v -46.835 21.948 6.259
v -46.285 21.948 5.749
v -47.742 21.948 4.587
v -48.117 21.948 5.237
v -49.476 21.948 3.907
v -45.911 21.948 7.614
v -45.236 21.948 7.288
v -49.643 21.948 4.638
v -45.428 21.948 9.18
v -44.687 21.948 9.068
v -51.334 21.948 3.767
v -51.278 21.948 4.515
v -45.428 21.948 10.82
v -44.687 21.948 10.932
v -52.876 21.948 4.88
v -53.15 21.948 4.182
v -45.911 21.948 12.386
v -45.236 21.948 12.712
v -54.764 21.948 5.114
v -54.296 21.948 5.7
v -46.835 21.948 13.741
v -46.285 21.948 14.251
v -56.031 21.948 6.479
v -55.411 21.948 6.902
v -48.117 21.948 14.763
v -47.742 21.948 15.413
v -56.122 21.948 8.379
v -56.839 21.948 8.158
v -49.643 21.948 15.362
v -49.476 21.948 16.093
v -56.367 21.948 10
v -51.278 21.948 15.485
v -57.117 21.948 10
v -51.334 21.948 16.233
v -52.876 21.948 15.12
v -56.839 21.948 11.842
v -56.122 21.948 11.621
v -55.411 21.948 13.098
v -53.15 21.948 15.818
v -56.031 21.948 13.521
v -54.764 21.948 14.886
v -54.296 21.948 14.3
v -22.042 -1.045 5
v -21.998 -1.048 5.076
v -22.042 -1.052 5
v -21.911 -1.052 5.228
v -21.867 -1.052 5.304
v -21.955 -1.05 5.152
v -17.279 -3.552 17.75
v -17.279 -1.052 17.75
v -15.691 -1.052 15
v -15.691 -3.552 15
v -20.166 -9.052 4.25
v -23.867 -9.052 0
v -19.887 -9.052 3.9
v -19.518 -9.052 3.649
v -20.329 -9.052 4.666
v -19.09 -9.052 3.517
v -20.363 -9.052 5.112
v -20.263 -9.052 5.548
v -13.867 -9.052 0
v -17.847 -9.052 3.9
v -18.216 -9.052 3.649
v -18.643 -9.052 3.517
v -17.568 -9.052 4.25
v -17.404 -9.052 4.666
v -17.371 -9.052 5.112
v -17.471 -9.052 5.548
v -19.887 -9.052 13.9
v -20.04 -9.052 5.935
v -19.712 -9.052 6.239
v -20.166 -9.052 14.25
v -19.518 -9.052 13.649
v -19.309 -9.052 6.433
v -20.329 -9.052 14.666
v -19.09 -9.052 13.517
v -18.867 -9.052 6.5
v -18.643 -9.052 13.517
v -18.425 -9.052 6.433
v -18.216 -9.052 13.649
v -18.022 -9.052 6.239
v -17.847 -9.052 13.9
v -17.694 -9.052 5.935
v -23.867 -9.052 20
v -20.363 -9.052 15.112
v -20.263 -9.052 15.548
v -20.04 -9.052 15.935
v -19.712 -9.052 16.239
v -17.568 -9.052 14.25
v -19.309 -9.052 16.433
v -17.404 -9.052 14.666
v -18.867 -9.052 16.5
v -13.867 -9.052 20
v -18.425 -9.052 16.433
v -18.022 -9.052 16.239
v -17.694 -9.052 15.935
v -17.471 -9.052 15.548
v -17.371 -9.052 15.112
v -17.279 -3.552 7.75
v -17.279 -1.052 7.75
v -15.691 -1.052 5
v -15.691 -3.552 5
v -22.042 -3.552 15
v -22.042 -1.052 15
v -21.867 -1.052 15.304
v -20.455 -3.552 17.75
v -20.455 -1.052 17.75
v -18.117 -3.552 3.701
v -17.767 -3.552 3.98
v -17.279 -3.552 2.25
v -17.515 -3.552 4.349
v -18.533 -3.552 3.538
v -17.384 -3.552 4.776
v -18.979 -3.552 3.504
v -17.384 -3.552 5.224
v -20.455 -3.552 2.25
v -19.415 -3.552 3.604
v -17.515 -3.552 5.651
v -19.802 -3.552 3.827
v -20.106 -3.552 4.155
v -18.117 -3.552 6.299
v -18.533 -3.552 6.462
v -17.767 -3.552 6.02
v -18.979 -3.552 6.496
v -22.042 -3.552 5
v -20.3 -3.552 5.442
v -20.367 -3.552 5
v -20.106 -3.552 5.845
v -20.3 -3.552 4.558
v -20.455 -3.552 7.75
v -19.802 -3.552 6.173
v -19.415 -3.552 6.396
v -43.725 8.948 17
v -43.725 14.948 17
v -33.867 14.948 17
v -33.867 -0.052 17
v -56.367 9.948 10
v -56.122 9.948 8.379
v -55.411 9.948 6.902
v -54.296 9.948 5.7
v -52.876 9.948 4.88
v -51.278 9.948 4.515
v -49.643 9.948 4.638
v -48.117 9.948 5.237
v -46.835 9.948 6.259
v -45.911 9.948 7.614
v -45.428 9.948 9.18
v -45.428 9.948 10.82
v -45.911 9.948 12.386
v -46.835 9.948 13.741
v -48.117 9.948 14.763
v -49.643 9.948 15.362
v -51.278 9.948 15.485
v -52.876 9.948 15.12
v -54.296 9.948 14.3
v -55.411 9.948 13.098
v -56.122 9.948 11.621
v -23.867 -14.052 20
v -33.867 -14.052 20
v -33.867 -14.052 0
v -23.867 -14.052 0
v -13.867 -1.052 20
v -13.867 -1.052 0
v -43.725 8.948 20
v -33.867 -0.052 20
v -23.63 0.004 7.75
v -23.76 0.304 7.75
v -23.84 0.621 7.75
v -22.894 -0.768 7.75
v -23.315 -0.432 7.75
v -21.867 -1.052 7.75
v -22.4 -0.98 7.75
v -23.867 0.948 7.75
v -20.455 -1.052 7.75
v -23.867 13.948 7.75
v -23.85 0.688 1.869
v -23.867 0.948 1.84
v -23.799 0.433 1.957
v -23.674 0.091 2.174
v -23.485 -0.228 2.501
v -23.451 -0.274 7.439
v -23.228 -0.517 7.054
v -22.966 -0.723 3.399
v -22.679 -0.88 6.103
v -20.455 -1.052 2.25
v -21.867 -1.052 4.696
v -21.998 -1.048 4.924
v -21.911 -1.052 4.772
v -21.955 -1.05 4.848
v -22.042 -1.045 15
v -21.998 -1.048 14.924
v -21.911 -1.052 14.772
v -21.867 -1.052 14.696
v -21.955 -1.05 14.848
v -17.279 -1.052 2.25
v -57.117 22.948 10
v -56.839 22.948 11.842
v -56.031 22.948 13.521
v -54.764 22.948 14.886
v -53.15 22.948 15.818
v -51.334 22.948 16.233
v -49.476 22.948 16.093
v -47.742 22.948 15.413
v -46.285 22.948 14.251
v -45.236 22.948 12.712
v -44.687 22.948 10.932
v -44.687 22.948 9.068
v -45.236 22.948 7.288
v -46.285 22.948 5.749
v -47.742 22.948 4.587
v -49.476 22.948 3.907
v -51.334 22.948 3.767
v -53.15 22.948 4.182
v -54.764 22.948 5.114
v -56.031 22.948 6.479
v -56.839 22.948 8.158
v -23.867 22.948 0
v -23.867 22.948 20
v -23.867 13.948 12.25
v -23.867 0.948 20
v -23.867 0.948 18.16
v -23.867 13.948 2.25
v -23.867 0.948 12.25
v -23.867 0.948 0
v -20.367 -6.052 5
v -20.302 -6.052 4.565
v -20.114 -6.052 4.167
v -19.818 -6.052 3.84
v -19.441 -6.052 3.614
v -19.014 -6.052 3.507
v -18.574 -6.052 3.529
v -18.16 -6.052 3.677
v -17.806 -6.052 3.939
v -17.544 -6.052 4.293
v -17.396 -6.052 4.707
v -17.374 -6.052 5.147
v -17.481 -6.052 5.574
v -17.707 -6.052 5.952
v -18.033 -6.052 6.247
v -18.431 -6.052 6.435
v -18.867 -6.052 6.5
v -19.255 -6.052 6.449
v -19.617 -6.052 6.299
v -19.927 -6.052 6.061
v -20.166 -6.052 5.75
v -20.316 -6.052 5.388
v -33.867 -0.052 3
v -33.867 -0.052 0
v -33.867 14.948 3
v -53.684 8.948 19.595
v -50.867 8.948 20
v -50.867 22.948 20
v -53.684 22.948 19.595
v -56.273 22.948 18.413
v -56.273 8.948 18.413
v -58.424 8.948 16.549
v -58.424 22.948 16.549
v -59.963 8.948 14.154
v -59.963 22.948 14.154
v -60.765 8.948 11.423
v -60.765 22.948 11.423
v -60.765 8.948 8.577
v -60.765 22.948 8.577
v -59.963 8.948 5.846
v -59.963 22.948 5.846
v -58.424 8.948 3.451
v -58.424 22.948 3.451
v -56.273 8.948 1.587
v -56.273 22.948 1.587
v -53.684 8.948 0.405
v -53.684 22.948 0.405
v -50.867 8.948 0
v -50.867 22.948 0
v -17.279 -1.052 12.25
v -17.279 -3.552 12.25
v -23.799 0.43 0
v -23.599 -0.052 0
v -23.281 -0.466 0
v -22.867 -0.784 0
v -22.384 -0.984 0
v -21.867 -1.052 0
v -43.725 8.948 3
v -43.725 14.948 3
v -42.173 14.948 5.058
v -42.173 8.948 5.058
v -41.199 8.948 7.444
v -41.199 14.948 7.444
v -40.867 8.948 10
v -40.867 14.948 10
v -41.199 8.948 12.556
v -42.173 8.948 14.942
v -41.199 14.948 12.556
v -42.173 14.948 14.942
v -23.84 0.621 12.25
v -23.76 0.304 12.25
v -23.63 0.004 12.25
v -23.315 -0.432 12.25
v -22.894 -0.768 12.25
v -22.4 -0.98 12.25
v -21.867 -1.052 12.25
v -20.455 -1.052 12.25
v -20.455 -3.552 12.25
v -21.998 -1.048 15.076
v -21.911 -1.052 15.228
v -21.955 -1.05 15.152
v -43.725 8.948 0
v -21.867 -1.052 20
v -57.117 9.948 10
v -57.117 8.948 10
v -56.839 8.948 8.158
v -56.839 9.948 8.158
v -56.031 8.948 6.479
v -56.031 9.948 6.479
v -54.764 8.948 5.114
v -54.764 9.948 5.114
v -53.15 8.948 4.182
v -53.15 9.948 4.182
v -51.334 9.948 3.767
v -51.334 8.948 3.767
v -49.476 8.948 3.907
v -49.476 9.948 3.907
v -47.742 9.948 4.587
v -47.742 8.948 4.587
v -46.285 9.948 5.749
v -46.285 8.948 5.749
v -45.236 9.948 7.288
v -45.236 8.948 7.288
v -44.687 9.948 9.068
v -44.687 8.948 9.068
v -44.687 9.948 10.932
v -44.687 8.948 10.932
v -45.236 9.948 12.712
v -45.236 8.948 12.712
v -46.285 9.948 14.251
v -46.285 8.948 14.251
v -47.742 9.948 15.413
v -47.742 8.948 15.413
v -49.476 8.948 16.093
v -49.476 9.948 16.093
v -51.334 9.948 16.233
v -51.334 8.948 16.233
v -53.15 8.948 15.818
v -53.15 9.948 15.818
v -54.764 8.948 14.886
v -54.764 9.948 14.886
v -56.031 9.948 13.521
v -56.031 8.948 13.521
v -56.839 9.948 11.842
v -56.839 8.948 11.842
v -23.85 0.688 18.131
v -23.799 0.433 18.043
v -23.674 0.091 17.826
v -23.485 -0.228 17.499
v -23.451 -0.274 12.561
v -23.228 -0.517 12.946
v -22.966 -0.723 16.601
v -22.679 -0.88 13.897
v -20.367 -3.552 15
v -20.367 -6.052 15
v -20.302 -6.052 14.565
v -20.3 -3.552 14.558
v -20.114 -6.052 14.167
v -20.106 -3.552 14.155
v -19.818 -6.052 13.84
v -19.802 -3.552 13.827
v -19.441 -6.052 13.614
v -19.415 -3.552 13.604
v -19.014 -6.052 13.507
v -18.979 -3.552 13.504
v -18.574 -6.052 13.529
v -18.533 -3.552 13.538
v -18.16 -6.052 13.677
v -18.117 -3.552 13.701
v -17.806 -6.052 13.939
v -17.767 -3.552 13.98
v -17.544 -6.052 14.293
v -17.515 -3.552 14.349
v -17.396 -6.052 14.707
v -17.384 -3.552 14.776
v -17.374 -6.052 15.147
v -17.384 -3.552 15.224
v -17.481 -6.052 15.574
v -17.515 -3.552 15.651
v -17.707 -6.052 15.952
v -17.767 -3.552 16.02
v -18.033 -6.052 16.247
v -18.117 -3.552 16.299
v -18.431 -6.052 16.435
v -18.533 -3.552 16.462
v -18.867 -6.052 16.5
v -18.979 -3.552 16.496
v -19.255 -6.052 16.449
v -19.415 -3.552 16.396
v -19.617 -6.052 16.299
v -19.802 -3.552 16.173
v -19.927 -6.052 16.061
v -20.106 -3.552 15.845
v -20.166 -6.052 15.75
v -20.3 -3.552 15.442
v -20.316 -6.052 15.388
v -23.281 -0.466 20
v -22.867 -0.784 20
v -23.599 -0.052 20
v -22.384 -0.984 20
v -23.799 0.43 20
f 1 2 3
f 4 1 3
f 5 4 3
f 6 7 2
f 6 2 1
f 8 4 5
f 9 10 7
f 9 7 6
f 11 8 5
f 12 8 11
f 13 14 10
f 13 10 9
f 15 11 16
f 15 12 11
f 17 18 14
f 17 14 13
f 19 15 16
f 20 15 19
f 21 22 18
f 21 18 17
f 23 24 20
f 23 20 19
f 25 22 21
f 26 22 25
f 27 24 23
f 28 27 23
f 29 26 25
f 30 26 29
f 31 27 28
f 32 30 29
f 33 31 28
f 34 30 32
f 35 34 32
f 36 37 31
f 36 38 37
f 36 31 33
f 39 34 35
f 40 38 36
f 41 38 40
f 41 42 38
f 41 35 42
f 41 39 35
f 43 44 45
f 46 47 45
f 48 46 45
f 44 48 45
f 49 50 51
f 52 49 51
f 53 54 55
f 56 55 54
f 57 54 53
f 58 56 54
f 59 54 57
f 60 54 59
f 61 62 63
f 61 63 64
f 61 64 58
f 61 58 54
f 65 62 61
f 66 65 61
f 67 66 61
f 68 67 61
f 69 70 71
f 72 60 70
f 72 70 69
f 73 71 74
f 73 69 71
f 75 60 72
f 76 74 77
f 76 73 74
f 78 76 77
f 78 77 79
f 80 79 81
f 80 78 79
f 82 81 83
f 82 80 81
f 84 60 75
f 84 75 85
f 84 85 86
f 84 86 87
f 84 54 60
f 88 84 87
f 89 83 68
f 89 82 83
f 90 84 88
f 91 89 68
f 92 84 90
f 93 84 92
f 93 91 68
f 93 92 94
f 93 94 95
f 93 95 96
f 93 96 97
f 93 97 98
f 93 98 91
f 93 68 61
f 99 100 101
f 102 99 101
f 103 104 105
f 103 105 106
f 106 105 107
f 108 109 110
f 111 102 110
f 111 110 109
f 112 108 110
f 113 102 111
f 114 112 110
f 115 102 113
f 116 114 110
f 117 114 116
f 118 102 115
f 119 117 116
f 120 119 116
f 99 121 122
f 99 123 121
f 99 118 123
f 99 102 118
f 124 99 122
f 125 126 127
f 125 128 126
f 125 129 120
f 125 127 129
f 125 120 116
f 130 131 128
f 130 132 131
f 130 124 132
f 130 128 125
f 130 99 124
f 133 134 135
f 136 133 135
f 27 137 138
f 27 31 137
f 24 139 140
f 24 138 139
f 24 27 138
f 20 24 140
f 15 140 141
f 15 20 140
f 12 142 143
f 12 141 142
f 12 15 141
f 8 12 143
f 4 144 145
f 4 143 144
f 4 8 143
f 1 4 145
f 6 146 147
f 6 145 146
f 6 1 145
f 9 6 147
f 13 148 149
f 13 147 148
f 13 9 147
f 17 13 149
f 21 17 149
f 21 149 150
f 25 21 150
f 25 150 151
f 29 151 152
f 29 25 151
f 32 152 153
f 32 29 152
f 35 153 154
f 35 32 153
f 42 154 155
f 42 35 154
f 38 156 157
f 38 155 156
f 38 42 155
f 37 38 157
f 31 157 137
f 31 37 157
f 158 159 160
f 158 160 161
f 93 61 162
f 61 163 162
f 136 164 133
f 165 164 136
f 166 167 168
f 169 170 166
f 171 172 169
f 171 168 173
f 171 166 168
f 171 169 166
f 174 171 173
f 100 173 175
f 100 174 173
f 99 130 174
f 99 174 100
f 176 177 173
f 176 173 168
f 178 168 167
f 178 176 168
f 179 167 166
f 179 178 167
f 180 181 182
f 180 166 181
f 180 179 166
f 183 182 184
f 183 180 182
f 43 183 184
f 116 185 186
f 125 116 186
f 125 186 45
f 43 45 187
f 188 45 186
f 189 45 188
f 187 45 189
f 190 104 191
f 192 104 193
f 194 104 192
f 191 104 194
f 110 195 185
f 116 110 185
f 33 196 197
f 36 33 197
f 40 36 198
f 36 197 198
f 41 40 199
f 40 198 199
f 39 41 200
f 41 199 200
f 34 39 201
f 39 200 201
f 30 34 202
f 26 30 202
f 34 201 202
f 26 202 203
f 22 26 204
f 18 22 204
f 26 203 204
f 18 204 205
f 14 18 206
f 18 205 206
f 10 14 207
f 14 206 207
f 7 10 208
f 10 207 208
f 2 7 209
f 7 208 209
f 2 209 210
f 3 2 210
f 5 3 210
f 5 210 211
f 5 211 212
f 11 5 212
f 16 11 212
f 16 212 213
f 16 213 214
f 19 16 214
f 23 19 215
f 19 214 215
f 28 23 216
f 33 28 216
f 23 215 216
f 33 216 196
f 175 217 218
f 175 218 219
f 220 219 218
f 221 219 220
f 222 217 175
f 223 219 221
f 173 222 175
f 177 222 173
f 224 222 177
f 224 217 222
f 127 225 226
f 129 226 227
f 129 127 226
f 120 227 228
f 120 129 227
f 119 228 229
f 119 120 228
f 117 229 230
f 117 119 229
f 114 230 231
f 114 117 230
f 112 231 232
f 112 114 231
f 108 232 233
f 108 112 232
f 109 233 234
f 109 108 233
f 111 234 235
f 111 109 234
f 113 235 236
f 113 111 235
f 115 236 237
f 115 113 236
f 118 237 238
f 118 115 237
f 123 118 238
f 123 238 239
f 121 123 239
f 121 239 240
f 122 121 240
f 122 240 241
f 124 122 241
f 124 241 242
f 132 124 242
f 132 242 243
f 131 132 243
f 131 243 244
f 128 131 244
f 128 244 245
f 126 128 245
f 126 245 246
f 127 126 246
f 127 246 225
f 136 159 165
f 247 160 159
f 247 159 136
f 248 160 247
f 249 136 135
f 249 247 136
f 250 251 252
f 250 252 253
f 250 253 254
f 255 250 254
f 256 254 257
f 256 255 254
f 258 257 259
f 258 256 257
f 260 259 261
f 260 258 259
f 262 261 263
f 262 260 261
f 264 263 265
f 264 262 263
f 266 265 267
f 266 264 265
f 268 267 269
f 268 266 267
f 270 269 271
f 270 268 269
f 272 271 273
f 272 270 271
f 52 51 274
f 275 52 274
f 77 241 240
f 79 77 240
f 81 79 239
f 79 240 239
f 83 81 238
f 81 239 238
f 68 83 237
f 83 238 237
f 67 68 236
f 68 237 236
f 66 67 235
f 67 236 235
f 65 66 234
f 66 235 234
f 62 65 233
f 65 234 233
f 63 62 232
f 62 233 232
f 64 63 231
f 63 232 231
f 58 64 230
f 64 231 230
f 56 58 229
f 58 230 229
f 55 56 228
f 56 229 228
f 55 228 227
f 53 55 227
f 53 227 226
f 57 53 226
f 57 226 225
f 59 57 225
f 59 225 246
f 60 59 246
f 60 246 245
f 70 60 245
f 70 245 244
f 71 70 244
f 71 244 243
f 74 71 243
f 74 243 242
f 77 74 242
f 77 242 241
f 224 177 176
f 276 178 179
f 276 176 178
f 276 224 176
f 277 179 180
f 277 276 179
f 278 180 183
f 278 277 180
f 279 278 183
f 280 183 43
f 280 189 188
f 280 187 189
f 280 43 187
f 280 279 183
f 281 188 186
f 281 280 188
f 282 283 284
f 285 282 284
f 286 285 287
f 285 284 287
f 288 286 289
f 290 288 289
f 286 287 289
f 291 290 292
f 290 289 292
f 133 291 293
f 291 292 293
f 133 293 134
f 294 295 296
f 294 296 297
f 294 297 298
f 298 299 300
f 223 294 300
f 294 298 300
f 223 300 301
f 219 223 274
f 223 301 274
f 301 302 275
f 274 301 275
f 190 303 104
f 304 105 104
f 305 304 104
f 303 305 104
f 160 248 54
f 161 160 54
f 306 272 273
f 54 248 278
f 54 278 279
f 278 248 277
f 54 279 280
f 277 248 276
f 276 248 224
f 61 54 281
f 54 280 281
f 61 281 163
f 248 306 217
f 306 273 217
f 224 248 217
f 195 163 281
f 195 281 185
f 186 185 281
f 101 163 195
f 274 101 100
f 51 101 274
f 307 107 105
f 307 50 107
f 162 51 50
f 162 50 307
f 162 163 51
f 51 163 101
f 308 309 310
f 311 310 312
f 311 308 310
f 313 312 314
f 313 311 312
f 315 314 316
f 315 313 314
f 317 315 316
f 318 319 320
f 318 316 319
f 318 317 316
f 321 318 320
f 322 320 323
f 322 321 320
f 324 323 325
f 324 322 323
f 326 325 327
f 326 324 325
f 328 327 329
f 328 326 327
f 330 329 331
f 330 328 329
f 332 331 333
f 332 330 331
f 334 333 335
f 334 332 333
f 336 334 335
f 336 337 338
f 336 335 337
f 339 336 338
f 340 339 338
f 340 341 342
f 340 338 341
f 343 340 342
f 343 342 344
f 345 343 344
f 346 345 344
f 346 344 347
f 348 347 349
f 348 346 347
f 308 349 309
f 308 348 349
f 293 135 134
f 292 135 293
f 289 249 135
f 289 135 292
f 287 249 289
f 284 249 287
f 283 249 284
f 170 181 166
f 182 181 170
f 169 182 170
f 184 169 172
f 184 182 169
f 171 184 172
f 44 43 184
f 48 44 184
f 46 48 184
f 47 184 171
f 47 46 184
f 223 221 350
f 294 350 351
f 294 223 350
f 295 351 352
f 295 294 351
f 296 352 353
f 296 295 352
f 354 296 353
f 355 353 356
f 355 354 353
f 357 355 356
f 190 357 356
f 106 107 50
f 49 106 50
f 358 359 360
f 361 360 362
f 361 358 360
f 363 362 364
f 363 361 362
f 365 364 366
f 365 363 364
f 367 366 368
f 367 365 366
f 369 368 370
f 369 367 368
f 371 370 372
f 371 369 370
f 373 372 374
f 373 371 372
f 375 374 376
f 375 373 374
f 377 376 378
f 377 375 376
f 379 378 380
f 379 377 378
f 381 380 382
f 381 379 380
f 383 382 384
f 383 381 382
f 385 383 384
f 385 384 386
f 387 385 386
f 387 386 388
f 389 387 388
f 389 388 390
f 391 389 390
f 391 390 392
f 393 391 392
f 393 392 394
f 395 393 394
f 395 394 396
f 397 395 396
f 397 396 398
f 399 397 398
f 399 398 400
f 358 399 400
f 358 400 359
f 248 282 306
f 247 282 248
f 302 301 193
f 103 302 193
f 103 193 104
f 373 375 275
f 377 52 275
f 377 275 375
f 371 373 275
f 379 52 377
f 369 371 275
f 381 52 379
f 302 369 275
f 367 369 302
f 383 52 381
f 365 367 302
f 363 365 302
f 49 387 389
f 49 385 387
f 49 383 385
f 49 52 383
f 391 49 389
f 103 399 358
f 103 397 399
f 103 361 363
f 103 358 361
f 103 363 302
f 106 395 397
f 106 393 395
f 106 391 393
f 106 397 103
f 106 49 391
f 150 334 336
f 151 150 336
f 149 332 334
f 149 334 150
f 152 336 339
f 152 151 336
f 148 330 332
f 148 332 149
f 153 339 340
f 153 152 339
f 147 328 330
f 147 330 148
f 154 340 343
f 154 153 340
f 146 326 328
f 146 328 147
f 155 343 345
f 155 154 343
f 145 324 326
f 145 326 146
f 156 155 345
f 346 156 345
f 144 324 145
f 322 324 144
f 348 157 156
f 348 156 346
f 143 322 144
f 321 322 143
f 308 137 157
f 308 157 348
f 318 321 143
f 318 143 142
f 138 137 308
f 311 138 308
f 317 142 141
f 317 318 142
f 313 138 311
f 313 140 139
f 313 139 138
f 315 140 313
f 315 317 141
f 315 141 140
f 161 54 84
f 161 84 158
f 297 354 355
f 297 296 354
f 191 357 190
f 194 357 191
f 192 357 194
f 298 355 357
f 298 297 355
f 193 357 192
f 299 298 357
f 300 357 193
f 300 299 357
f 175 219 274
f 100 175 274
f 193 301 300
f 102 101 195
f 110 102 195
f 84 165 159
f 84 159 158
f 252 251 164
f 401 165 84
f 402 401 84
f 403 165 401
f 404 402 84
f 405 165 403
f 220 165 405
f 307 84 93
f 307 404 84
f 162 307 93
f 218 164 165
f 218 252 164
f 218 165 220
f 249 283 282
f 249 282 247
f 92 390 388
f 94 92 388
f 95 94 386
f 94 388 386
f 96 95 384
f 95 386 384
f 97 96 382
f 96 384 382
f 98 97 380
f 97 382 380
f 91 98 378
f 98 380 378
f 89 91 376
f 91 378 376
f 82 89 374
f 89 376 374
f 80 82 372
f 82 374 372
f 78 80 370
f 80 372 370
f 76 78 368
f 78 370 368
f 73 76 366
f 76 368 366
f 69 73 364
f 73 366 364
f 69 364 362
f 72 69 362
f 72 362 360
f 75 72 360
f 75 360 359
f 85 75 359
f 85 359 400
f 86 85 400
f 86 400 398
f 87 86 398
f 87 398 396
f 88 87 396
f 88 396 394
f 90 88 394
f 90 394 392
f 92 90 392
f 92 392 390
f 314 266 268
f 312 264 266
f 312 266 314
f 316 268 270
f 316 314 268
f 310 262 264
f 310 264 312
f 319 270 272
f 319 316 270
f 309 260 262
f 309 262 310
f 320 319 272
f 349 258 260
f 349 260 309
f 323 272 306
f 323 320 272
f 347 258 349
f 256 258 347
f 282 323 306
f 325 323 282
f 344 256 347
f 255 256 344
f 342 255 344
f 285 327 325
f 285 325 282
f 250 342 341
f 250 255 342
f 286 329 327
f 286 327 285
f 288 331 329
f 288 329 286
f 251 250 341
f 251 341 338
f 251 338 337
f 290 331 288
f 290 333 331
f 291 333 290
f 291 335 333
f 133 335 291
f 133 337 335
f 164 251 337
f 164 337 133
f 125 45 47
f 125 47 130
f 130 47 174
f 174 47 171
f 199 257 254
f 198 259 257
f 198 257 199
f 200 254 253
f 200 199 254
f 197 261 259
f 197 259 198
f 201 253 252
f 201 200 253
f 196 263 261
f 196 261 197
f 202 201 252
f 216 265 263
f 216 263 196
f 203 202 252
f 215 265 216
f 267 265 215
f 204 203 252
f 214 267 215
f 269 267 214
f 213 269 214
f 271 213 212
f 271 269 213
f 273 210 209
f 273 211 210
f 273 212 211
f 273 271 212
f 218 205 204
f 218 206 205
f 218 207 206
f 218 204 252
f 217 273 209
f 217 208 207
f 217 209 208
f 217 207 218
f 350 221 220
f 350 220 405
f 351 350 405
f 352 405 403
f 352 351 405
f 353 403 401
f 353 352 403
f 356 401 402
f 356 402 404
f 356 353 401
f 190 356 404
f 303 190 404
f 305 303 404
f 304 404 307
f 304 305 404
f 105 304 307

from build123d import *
from build123d.topology import SkipClean

# Parameters (mm, degrees)
EXTRUDE_1_DEPTH           = 20
SKETCH_3_R                = 5.5
CUT_EXTRUDE_2_DEPTH       = 10
SKETCH_9_R                = 6.25
CUT_EXTRUDE_6_DEPTH       = 1
SKETCH_11_W               = 20
SKETCH_11_H               = 5
EXTRUDE_4_DEPTH           = 10
CUT_EXTRUDE_8_REACH       = 78.472
SKETCH_12_R               = 1.5
SKETCH_13_R               = 3
CUT_EXTRUDE_9_DEPTH       = 2.5
SKETCH_14_R               = 10
SKETCH_14_R_2             = 5.5
EXTRUDE_5_DEPTH           = 6
CUT_EXTRUDE_START         = -1
SKETCH_6_R                = 6.25
CUT_EXTRUDE_10_DEPTH      = 1
SKETCH_15_W               = 20
SKETCH_15_H               = 5
EXTRUDE_6_DEPTH           = 5
SKETCH_16_W               = 17
SKETCH_16_H               = 3
EXTRUDE_7_DEPTH           = 15
CUT_EXTRUDE_11_DEPTH      = 70.961190435
CUT_EXTRUDE_11_DEPTH_BACK = 70.961190435
EXTRUDE_START             = -5
SKETCH_3D_3_R             = 1.5
EXTRUDE_8_DEPTH           = 5
CUT_EXTRUDE_12_DEPTH      = 2.5
FILLET_1_R                = 2
CUT_EXTRUDE_14_DEPTH      = 76.06644022
SKETCH_21_W               = 6.587713241
SKETCH_21_H               = 4.5
EXTRUDE_9_DEPTH           = 15
SKETCH_23_W               = 25
SKETCH_23_H               = 20
CUT_EXTRUDE_16_DEPTH      = 5
CUT_EXTRUDE_17_DEPTH      = 10
SKETCH_25_W               = 10
SKETCH_25_H               = 20
EXTRUDE_10_DEPTH          = 3
SKETCH_26_R               = 1.5
CUT_EXTRUDE_18_DEPTH      = 71.326165394
SKETCH_27_R               = 1.5
CUT_EXTRUDE_19_DEPTH      = 71.326165394


with BuildPart() as part:
    # 草图1 → 凸台-拉伸1 (new body)
    with BuildSketch(Plane.XY):
        Polygon((-63.866818046, 22.947717095), (-23.866818046, 22.947717095), (-23.866818046, -19.052282905), (-33.866818046, -19.052282905), (-33.866818046, 14.947717095), (-63.866818046, 14.947717095), align=None)
    extrude(amount=EXTRUDE_1_DEPTH)

    # 草图3 → 切除-拉伸2 (cut)
    with BuildSketch(Plane(origin=(0, 22.947717095, 0), x_dir=(-1, 0, 0), z_dir=(0, 1, 0))):
        with Locations((50.866818046, 10)):
            Circle(SKETCH_3_R)
    extrude(amount=-CUT_EXTRUDE_2_DEPTH, mode=Mode.SUBTRACT)

    # 草图9 → 切除-拉伸6 (cut)
    with BuildSketch(Plane(origin=(0, 22.947717095, 0), x_dir=(1, 0, 0), z_dir=(0, 1, 0))):
        with Locations(Location((-50.866818046, -10, 0), (0, 0, 180))):
            Circle(SKETCH_9_R)
    extrude(amount=-CUT_EXTRUDE_6_DEPTH, mode=Mode.SUBTRACT)

    # 草图11 → 凸台-拉伸4 (add)
    with BuildSketch(Plane(origin=(-23.866818046, 0, 0), x_dir=(0, 0, -1), z_dir=(1, 0, 0))):
        with Locations((-10, -16.552282905)):
            Rectangle(SKETCH_11_W, SKETCH_11_H)
    extrude(amount=EXTRUDE_4_DEPTH)

    # 草图12 → 切除-拉伸8 (cut, up to next)
    with BuildSketch(Plane(origin=(0, -14.052282905, 0), x_dir=(-1, 0, 0), z_dir=(0, 1, 0)), mode=Mode.PRIVATE) as cut_extrude_8_sk1:
        with Locations((18.866818046, 5)):
            Circle(SKETCH_12_R)
    cut_extrude_8_tool1 = extrude(cut_extrude_8_sk1.sketch, amount=-CUT_EXTRUDE_8_REACH, mode=Mode.PRIVATE) & part.part
    # 草图12 → 切除-拉伸8 (cut, up to next)
    with BuildSketch(Plane(origin=(0, -14.052282905, 0), x_dir=(-1, 0, 0), z_dir=(0, 1, 0)), mode=Mode.PRIVATE) as cut_extrude_8_sk2:
        with Locations((18.866818046, 15)):
            Circle(SKETCH_12_R)
    cut_extrude_8_tool2 = extrude(cut_extrude_8_sk2.sketch, amount=-CUT_EXTRUDE_8_REACH, mode=Mode.PRIVATE) & part.part
    add(cut_extrude_8_tool1.solids().sort_by_distance((-18.866818, -14.052283, 5))[0], mode=Mode.SUBTRACT)
    add(cut_extrude_8_tool2.solids().sort_by_distance((-18.866818, -14.052283, 15))[0], mode=Mode.SUBTRACT)

    # 草图13 → 切除-拉伸9 (cut)
    with BuildSketch(Plane.XZ.offset(19.052282905)):
        with Locations(Location((-18.866818046, 15, 0), (0, 0, 270))):
            Circle(SKETCH_13_R)
        with Locations(Location((-18.866818046, 5, 0), (0, 0, 270))):
            Circle(SKETCH_13_R)
    extrude(amount=-CUT_EXTRUDE_9_DEPTH, mode=Mode.SUBTRACT)

    # 草图14 → 凸台-拉伸5 (add)
    with SkipClean():  # the faces are left unmerged after this step: merging them gives an invalid solid
        with BuildSketch(Plane.XZ.offset(-14.947717095)):
            with Locations(Location((-50.866818046, 10, 0), (0, 0, 270))):
                Circle(SKETCH_14_R)
            with Locations(Location((-50.866818046, 10, 0), (0, 0, 180))):
                Circle(SKETCH_14_R_2, mode=Mode.SUBTRACT)
        extrude(amount=EXTRUDE_5_DEPTH)

    # 草图6 → 切除-拉伸10 (cut)
    with BuildSketch(Plane.XZ.offset(-8.947717095).offset(CUT_EXTRUDE_START)):
        with Locations(Location((-50.866818046, 10, 0), (0, 0, 180))):
            Circle(SKETCH_6_R)
    extrude(amount=CUT_EXTRUDE_10_DEPTH, mode=Mode.SUBTRACT)

    # 草图15 → 凸台-拉伸6 (add)
    with BuildSketch(Plane(origin=(-13.866818046, 0, 0), x_dir=(0, 0, -1), z_dir=(1, 0, 0))):
        with Locations((-10, -16.552282905)):
            Rectangle(SKETCH_15_W, SKETCH_15_H)
    extrude(amount=EXTRUDE_6_DEPTH)

    # 草图16 → 凸台-拉伸7 (add)
    with BuildSketch(Plane.XZ.offset(-14.947717095)):
        with Locations((-42.366818046, 18.5)):
            Rectangle(SKETCH_16_W, SKETCH_16_H)
        with Locations((-42.366818046, 1.5)):
            Rectangle(SKETCH_16_W, SKETCH_16_H)
    extrude(amount=EXTRUDE_7_DEPTH)

    # 草图17 → 切除-拉伸11 (cut, two sides: drawn at the far end of the back side and taken through both)
    with BuildSketch(Plane(origin=(0, 0, 17), x_dir=(-1, 0, 0), z_dir=(0, 0, -1)).offset(-CUT_EXTRUDE_11_DEPTH_BACK)):
        Polygon((50.866818046, 8.947717095), (43.725389617, 8.947717095), (33.866818046, -0.052282905), (50.866818046, -0.052282905), align=None)
    extrude(amount=CUT_EXTRUDE_11_DEPTH + CUT_EXTRUDE_11_DEPTH_BACK, mode=Mode.SUBTRACT)

    # Sketch 3D_3 → 凸台-拉伸8 (add)
    with BuildSketch(Plane(origin=(-23.866818046, -6.052282905, 20), x_dir=(0.447213595499958, 0, -0.894427190999916), z_dir=(0, -1, 0)).offset(EXTRUDE_START)):
        Polygon((0, 0), (4.472135955, 8.94427191), (22.360679775, 0), (17.88854382, -8.94427191), align=None)
        with Locations(Location((6.708203932, 2.236067977, 0), (0, 0, 243.434948823))):
            Circle(SKETCH_3D_3_R, mode=Mode.SUBTRACT)
        with Locations(Location((15.652475842, -2.236067977, 0), (0, 0, 243.434948823))):
            Circle(SKETCH_3D_3_R, mode=Mode.SUBTRACT)
    extrude(amount=EXTRUDE_8_DEPTH)

    # 草图18 → 切除-拉伸12 (cut)
    with BuildSketch(Plane(origin=(0, -1.052282905, 0), x_dir=(-1, 0, 0), z_dir=(0, 1, 0))):
        Polygon((15.691391565, 15), (17.279104805, 12.25), (20.454531286, 12.25), (22.042244526, 15), (20.454531286, 17.75), (17.279104805, 17.75), align=None)
        Polygon((15.691391565, 5), (17.279104805, 2.25), (20.454531286, 2.25), (22.042244526, 5), (20.454531286, 7.75), (17.279104805, 7.75), align=None)
    extrude(amount=-CUT_EXTRUDE_12_DEPTH, mode=Mode.SUBTRACT)

    # 圆角1
    # the kernel refuses this fillet: 2 mm, written as the material it adds along each edge
    with BuildSketch(Plane(origin=(-23.866818046, -1.052282905, 0), x_dir=(0, 1, 0), z_dir=(0, 0, 1))) as fillet_1_piece_1_section:
        with BuildLine():
            CenterArc((FILLET_1_R, -FILLET_1_R), FILLET_1_R, 90, 90)
            Line((0, -FILLET_1_R), (0, 0))
            Line((0, 0), (FILLET_1_R, 0))
        make_face()
    fillet_1_piece_1 = extrude(amount=20, mode=Mode.PRIVATE)
    fillet_1_piece_1 = split(fillet_1_piece_1, bisect_by=Plane(origin=(-20.802583542, -0.671658343, 2.852844192), z_dir=(-0.8660254037844387, 0, -0.5000000000000001)), keep=Keep.TOP, mode=Mode.PRIVATE)
    fillet_1_piece_1 = split(fillet_1_piece_1, bisect_by=Plane(origin=(-23.907001975, -0.671658343, 1.770145354), z_dir=(0.8660254037844387, 0, -0.5000000000000003)), keep=Keep.TOP, mode=Mode.PRIVATE)
    add(fillet_1_piece_1)
    with BuildSketch(Plane(origin=(-23.866818046, -1.052282905, 0), x_dir=(0, 1, 0), z_dir=(0, 0, 1))) as fillet_1_piece_2_section:
        with BuildLine():
            CenterArc((FILLET_1_R, -FILLET_1_R), FILLET_1_R, 90, 90)
            Line((0, -FILLET_1_R), (0, 0))
            Line((0, 0), (FILLET_1_R, 0))
        make_face()
    fillet_1_piece_2 = extrude(amount=20, mode=Mode.PRIVATE)
    fillet_1_piece_2 = split(fillet_1_piece_2, bisect_by=Plane(origin=(-22.4188867, -0.519681884, 5.652363381), z_dir=(-0.8660254037844387, 0, -0.5000000000000001)), keep=Keep.TOP, mode=Mode.PRIVATE)
    fillet_1_piece_2 = split(fillet_1_piece_2, bisect_by=Plane(origin=(-22.4188867, -0.519681884, 4.347636619), z_dir=(-0.8660254037844387, 0, 0.5000000000000003)), keep=Keep.TOP, mode=Mode.PRIVATE)
    add(fillet_1_piece_2)
    with BuildSketch(Plane(origin=(-23.866818046, -1.052282905, 0), x_dir=(0, 1, 0), z_dir=(0, 0, 1))) as fillet_1_piece_3_section:
        with BuildLine():
            CenterArc((FILLET_1_R, -FILLET_1_R), FILLET_1_R, 90, 90)
            Line((0, -FILLET_1_R), (0, 0))
            Line((0, 0), (FILLET_1_R, 0))
        make_face()
    fillet_1_piece_3 = extrude(amount=20, mode=Mode.PRIVATE)
    fillet_1_piece_3 = split(fillet_1_piece_3, bisect_by=Plane(origin=(-24.519856268, -0.671658343, 9.291349419), z_dir=(0.8660254037844387, 0, 0.5000000000000001)), keep=Keep.TOP, mode=Mode.PRIVATE)
    fillet_1_piece_3 = split(fillet_1_piece_3, bisect_by=Plane(origin=(-20.189729249, -0.671658343, 8.208650581), z_dir=(-0.8660254037844387, 0, 0.5000000000000003)), keep=Keep.TOP, mode=Mode.PRIVATE)
    fillet_1_piece_3 = split(fillet_1_piece_3, bisect_by=Plane(origin=(-20.189729249, -0.671658343, 11.791349419), z_dir=(-0.8660254037844387, 0, -0.5)), keep=Keep.TOP, mode=Mode.PRIVATE)
    fillet_1_piece_3 = split(fillet_1_piece_3, bisect_by=Plane(origin=(-24.519856268, -0.671658343, 10.708650581), z_dir=(0.8660254037844384, 0, -0.5000000000000004)), keep=Keep.TOP, mode=Mode.PRIVATE)
    add(fillet_1_piece_3)
    with BuildSketch(Plane(origin=(-23.866818046, -1.052282905, 0), x_dir=(0, 1, 0), z_dir=(0, 0, 1))) as fillet_1_piece_4_section:
        with BuildLine():
            CenterArc((FILLET_1_R, -FILLET_1_R), FILLET_1_R, 90, 90)
            Line((0, -FILLET_1_R), (0, 0))
            Line((0, 0), (FILLET_1_R, 0))
        make_face()
    fillet_1_piece_4 = extrude(amount=20, mode=Mode.PRIVATE)
    fillet_1_piece_4 = split(fillet_1_piece_4, bisect_by=Plane(origin=(-22.4188867, -0.519681884, 15.652363381), z_dir=(-0.8660254037844387, 0, -0.5)), keep=Keep.TOP, mode=Mode.PRIVATE)
    fillet_1_piece_4 = split(fillet_1_piece_4, bisect_by=Plane(origin=(-22.4188867, -0.519681884, 14.347636619), z_dir=(-0.8660254037844384, 0, 0.5000000000000004)), keep=Keep.TOP, mode=Mode.PRIVATE)
    add(fillet_1_piece_4)
    with BuildSketch(Plane(origin=(-23.866818046, -1.052282905, 0), x_dir=(0, 1, 0), z_dir=(0, 0, 1))) as fillet_1_piece_5_section:
        with BuildLine():
            CenterArc((FILLET_1_R, -FILLET_1_R), FILLET_1_R, 90, 90)
            Line((0, -FILLET_1_R), (0, 0))
            Line((0, 0), (FILLET_1_R, 0))
        make_face()
    fillet_1_piece_5 = extrude(amount=20, mode=Mode.PRIVATE)
    fillet_1_piece_5 = split(fillet_1_piece_5, bisect_by=Plane(origin=(-23.907001975, -0.671658343, 18.229854646), z_dir=(0.8660254037844387, 0, 0.5)), keep=Keep.TOP, mode=Mode.PRIVATE)
    fillet_1_piece_5 = split(fillet_1_piece_5, bisect_by=Plane(origin=(-20.802583542, -0.671658343, 17.147155808), z_dir=(-0.8660254037844384, 0, 0.5000000000000004)), keep=Keep.TOP, mode=Mode.PRIVATE)
    add(fillet_1_piece_5)

    # 草图20 → 切除-拉伸14 (cut, through all)
    with SkipClean():  # the faces are left unmerged after this step: merging them gives an invalid solid
        with BuildSketch(Plane.XZ.offset(-14.947717095)):
            with BuildLine():
                Line((-63.866818046, 20), (-50.866818046, 20))
                ThreePointArc((-50.866818046, 20), (-60.866818046, 10), (-50.866818046, 0))
                Line((-50.866818046, 0), (-63.866818046, 0))
                Line((-63.866818046, 0), (-63.866818046, 20))
            make_face()
        extrude(amount=-CUT_EXTRUDE_14_DEPTH, mode=Mode.SUBTRACT)
    add(part.part.scale(1), mode=Mode.REPLACE)  # the faces are merged on a copy

    # 草图21 → 凸台-拉伸9 (add)
    with BuildSketch(Plane(origin=(0, -1.052282905, 0), x_dir=(1, 0, 0), z_dir=(0, 1, 0))):
        with Locations((-20.572961426, -10)):
            Rectangle(SKETCH_21_W, SKETCH_21_H)
    extrude(amount=EXTRUDE_9_DEPTH)

    # 草图23 → 切除-拉伸16 (cut)
    with BuildSketch(Plane.XZ.offset(19.052282905)):
        with Locations((-21.366818046, 10)):
            Rectangle(SKETCH_23_W, SKETCH_23_H)
    extrude(amount=-CUT_EXTRUDE_16_DEPTH, mode=Mode.SUBTRACT)

    # 草图24 → 切除-拉伸17 (cut)
    with BuildSketch(Plane.XY.offset(12.25)):
        Polygon((-23.866818046, 13.947717095), (-17.279104805, -1.052282905), (-17.279104805, 13.947717095), align=None)
    extrude(amount=-CUT_EXTRUDE_17_DEPTH, mode=Mode.SUBTRACT)

    # 草图25 → 凸台-拉伸10 (add)
    with BuildSketch(Plane.XZ.offset(6.052282905)):
        with Locations((-18.866818046, 10)):
            Rectangle(SKETCH_25_W, SKETCH_25_H)
    extrude(amount=EXTRUDE_10_DEPTH)

    # 草图26 → 切除-拉伸18 (cut, through all)
    with BuildSketch(Plane(origin=(0, -6.052282905, 0), x_dir=(1, 0, 0), z_dir=(0, 1, 0))):
        with Locations(Location((-18.866818046, -15, 0), (0, 0, 270))):
            Circle(SKETCH_26_R)
    extrude(amount=-CUT_EXTRUDE_18_DEPTH, mode=Mode.SUBTRACT)

    # 草图27 → 切除-拉伸19 (cut, through all)
    with BuildSketch(Plane(origin=(0, -6.052282905, 0), x_dir=(1, 0, 0), z_dir=(0, 1, 0))):
        with Locations(Location((-18.866818046, -5, 0), (0, 0, 270))):
            Circle(SKETCH_27_R)
    extrude(amount=-CUT_EXTRUDE_19_DEPTH, mode=Mode.SUBTRACT)


solid = part.part
